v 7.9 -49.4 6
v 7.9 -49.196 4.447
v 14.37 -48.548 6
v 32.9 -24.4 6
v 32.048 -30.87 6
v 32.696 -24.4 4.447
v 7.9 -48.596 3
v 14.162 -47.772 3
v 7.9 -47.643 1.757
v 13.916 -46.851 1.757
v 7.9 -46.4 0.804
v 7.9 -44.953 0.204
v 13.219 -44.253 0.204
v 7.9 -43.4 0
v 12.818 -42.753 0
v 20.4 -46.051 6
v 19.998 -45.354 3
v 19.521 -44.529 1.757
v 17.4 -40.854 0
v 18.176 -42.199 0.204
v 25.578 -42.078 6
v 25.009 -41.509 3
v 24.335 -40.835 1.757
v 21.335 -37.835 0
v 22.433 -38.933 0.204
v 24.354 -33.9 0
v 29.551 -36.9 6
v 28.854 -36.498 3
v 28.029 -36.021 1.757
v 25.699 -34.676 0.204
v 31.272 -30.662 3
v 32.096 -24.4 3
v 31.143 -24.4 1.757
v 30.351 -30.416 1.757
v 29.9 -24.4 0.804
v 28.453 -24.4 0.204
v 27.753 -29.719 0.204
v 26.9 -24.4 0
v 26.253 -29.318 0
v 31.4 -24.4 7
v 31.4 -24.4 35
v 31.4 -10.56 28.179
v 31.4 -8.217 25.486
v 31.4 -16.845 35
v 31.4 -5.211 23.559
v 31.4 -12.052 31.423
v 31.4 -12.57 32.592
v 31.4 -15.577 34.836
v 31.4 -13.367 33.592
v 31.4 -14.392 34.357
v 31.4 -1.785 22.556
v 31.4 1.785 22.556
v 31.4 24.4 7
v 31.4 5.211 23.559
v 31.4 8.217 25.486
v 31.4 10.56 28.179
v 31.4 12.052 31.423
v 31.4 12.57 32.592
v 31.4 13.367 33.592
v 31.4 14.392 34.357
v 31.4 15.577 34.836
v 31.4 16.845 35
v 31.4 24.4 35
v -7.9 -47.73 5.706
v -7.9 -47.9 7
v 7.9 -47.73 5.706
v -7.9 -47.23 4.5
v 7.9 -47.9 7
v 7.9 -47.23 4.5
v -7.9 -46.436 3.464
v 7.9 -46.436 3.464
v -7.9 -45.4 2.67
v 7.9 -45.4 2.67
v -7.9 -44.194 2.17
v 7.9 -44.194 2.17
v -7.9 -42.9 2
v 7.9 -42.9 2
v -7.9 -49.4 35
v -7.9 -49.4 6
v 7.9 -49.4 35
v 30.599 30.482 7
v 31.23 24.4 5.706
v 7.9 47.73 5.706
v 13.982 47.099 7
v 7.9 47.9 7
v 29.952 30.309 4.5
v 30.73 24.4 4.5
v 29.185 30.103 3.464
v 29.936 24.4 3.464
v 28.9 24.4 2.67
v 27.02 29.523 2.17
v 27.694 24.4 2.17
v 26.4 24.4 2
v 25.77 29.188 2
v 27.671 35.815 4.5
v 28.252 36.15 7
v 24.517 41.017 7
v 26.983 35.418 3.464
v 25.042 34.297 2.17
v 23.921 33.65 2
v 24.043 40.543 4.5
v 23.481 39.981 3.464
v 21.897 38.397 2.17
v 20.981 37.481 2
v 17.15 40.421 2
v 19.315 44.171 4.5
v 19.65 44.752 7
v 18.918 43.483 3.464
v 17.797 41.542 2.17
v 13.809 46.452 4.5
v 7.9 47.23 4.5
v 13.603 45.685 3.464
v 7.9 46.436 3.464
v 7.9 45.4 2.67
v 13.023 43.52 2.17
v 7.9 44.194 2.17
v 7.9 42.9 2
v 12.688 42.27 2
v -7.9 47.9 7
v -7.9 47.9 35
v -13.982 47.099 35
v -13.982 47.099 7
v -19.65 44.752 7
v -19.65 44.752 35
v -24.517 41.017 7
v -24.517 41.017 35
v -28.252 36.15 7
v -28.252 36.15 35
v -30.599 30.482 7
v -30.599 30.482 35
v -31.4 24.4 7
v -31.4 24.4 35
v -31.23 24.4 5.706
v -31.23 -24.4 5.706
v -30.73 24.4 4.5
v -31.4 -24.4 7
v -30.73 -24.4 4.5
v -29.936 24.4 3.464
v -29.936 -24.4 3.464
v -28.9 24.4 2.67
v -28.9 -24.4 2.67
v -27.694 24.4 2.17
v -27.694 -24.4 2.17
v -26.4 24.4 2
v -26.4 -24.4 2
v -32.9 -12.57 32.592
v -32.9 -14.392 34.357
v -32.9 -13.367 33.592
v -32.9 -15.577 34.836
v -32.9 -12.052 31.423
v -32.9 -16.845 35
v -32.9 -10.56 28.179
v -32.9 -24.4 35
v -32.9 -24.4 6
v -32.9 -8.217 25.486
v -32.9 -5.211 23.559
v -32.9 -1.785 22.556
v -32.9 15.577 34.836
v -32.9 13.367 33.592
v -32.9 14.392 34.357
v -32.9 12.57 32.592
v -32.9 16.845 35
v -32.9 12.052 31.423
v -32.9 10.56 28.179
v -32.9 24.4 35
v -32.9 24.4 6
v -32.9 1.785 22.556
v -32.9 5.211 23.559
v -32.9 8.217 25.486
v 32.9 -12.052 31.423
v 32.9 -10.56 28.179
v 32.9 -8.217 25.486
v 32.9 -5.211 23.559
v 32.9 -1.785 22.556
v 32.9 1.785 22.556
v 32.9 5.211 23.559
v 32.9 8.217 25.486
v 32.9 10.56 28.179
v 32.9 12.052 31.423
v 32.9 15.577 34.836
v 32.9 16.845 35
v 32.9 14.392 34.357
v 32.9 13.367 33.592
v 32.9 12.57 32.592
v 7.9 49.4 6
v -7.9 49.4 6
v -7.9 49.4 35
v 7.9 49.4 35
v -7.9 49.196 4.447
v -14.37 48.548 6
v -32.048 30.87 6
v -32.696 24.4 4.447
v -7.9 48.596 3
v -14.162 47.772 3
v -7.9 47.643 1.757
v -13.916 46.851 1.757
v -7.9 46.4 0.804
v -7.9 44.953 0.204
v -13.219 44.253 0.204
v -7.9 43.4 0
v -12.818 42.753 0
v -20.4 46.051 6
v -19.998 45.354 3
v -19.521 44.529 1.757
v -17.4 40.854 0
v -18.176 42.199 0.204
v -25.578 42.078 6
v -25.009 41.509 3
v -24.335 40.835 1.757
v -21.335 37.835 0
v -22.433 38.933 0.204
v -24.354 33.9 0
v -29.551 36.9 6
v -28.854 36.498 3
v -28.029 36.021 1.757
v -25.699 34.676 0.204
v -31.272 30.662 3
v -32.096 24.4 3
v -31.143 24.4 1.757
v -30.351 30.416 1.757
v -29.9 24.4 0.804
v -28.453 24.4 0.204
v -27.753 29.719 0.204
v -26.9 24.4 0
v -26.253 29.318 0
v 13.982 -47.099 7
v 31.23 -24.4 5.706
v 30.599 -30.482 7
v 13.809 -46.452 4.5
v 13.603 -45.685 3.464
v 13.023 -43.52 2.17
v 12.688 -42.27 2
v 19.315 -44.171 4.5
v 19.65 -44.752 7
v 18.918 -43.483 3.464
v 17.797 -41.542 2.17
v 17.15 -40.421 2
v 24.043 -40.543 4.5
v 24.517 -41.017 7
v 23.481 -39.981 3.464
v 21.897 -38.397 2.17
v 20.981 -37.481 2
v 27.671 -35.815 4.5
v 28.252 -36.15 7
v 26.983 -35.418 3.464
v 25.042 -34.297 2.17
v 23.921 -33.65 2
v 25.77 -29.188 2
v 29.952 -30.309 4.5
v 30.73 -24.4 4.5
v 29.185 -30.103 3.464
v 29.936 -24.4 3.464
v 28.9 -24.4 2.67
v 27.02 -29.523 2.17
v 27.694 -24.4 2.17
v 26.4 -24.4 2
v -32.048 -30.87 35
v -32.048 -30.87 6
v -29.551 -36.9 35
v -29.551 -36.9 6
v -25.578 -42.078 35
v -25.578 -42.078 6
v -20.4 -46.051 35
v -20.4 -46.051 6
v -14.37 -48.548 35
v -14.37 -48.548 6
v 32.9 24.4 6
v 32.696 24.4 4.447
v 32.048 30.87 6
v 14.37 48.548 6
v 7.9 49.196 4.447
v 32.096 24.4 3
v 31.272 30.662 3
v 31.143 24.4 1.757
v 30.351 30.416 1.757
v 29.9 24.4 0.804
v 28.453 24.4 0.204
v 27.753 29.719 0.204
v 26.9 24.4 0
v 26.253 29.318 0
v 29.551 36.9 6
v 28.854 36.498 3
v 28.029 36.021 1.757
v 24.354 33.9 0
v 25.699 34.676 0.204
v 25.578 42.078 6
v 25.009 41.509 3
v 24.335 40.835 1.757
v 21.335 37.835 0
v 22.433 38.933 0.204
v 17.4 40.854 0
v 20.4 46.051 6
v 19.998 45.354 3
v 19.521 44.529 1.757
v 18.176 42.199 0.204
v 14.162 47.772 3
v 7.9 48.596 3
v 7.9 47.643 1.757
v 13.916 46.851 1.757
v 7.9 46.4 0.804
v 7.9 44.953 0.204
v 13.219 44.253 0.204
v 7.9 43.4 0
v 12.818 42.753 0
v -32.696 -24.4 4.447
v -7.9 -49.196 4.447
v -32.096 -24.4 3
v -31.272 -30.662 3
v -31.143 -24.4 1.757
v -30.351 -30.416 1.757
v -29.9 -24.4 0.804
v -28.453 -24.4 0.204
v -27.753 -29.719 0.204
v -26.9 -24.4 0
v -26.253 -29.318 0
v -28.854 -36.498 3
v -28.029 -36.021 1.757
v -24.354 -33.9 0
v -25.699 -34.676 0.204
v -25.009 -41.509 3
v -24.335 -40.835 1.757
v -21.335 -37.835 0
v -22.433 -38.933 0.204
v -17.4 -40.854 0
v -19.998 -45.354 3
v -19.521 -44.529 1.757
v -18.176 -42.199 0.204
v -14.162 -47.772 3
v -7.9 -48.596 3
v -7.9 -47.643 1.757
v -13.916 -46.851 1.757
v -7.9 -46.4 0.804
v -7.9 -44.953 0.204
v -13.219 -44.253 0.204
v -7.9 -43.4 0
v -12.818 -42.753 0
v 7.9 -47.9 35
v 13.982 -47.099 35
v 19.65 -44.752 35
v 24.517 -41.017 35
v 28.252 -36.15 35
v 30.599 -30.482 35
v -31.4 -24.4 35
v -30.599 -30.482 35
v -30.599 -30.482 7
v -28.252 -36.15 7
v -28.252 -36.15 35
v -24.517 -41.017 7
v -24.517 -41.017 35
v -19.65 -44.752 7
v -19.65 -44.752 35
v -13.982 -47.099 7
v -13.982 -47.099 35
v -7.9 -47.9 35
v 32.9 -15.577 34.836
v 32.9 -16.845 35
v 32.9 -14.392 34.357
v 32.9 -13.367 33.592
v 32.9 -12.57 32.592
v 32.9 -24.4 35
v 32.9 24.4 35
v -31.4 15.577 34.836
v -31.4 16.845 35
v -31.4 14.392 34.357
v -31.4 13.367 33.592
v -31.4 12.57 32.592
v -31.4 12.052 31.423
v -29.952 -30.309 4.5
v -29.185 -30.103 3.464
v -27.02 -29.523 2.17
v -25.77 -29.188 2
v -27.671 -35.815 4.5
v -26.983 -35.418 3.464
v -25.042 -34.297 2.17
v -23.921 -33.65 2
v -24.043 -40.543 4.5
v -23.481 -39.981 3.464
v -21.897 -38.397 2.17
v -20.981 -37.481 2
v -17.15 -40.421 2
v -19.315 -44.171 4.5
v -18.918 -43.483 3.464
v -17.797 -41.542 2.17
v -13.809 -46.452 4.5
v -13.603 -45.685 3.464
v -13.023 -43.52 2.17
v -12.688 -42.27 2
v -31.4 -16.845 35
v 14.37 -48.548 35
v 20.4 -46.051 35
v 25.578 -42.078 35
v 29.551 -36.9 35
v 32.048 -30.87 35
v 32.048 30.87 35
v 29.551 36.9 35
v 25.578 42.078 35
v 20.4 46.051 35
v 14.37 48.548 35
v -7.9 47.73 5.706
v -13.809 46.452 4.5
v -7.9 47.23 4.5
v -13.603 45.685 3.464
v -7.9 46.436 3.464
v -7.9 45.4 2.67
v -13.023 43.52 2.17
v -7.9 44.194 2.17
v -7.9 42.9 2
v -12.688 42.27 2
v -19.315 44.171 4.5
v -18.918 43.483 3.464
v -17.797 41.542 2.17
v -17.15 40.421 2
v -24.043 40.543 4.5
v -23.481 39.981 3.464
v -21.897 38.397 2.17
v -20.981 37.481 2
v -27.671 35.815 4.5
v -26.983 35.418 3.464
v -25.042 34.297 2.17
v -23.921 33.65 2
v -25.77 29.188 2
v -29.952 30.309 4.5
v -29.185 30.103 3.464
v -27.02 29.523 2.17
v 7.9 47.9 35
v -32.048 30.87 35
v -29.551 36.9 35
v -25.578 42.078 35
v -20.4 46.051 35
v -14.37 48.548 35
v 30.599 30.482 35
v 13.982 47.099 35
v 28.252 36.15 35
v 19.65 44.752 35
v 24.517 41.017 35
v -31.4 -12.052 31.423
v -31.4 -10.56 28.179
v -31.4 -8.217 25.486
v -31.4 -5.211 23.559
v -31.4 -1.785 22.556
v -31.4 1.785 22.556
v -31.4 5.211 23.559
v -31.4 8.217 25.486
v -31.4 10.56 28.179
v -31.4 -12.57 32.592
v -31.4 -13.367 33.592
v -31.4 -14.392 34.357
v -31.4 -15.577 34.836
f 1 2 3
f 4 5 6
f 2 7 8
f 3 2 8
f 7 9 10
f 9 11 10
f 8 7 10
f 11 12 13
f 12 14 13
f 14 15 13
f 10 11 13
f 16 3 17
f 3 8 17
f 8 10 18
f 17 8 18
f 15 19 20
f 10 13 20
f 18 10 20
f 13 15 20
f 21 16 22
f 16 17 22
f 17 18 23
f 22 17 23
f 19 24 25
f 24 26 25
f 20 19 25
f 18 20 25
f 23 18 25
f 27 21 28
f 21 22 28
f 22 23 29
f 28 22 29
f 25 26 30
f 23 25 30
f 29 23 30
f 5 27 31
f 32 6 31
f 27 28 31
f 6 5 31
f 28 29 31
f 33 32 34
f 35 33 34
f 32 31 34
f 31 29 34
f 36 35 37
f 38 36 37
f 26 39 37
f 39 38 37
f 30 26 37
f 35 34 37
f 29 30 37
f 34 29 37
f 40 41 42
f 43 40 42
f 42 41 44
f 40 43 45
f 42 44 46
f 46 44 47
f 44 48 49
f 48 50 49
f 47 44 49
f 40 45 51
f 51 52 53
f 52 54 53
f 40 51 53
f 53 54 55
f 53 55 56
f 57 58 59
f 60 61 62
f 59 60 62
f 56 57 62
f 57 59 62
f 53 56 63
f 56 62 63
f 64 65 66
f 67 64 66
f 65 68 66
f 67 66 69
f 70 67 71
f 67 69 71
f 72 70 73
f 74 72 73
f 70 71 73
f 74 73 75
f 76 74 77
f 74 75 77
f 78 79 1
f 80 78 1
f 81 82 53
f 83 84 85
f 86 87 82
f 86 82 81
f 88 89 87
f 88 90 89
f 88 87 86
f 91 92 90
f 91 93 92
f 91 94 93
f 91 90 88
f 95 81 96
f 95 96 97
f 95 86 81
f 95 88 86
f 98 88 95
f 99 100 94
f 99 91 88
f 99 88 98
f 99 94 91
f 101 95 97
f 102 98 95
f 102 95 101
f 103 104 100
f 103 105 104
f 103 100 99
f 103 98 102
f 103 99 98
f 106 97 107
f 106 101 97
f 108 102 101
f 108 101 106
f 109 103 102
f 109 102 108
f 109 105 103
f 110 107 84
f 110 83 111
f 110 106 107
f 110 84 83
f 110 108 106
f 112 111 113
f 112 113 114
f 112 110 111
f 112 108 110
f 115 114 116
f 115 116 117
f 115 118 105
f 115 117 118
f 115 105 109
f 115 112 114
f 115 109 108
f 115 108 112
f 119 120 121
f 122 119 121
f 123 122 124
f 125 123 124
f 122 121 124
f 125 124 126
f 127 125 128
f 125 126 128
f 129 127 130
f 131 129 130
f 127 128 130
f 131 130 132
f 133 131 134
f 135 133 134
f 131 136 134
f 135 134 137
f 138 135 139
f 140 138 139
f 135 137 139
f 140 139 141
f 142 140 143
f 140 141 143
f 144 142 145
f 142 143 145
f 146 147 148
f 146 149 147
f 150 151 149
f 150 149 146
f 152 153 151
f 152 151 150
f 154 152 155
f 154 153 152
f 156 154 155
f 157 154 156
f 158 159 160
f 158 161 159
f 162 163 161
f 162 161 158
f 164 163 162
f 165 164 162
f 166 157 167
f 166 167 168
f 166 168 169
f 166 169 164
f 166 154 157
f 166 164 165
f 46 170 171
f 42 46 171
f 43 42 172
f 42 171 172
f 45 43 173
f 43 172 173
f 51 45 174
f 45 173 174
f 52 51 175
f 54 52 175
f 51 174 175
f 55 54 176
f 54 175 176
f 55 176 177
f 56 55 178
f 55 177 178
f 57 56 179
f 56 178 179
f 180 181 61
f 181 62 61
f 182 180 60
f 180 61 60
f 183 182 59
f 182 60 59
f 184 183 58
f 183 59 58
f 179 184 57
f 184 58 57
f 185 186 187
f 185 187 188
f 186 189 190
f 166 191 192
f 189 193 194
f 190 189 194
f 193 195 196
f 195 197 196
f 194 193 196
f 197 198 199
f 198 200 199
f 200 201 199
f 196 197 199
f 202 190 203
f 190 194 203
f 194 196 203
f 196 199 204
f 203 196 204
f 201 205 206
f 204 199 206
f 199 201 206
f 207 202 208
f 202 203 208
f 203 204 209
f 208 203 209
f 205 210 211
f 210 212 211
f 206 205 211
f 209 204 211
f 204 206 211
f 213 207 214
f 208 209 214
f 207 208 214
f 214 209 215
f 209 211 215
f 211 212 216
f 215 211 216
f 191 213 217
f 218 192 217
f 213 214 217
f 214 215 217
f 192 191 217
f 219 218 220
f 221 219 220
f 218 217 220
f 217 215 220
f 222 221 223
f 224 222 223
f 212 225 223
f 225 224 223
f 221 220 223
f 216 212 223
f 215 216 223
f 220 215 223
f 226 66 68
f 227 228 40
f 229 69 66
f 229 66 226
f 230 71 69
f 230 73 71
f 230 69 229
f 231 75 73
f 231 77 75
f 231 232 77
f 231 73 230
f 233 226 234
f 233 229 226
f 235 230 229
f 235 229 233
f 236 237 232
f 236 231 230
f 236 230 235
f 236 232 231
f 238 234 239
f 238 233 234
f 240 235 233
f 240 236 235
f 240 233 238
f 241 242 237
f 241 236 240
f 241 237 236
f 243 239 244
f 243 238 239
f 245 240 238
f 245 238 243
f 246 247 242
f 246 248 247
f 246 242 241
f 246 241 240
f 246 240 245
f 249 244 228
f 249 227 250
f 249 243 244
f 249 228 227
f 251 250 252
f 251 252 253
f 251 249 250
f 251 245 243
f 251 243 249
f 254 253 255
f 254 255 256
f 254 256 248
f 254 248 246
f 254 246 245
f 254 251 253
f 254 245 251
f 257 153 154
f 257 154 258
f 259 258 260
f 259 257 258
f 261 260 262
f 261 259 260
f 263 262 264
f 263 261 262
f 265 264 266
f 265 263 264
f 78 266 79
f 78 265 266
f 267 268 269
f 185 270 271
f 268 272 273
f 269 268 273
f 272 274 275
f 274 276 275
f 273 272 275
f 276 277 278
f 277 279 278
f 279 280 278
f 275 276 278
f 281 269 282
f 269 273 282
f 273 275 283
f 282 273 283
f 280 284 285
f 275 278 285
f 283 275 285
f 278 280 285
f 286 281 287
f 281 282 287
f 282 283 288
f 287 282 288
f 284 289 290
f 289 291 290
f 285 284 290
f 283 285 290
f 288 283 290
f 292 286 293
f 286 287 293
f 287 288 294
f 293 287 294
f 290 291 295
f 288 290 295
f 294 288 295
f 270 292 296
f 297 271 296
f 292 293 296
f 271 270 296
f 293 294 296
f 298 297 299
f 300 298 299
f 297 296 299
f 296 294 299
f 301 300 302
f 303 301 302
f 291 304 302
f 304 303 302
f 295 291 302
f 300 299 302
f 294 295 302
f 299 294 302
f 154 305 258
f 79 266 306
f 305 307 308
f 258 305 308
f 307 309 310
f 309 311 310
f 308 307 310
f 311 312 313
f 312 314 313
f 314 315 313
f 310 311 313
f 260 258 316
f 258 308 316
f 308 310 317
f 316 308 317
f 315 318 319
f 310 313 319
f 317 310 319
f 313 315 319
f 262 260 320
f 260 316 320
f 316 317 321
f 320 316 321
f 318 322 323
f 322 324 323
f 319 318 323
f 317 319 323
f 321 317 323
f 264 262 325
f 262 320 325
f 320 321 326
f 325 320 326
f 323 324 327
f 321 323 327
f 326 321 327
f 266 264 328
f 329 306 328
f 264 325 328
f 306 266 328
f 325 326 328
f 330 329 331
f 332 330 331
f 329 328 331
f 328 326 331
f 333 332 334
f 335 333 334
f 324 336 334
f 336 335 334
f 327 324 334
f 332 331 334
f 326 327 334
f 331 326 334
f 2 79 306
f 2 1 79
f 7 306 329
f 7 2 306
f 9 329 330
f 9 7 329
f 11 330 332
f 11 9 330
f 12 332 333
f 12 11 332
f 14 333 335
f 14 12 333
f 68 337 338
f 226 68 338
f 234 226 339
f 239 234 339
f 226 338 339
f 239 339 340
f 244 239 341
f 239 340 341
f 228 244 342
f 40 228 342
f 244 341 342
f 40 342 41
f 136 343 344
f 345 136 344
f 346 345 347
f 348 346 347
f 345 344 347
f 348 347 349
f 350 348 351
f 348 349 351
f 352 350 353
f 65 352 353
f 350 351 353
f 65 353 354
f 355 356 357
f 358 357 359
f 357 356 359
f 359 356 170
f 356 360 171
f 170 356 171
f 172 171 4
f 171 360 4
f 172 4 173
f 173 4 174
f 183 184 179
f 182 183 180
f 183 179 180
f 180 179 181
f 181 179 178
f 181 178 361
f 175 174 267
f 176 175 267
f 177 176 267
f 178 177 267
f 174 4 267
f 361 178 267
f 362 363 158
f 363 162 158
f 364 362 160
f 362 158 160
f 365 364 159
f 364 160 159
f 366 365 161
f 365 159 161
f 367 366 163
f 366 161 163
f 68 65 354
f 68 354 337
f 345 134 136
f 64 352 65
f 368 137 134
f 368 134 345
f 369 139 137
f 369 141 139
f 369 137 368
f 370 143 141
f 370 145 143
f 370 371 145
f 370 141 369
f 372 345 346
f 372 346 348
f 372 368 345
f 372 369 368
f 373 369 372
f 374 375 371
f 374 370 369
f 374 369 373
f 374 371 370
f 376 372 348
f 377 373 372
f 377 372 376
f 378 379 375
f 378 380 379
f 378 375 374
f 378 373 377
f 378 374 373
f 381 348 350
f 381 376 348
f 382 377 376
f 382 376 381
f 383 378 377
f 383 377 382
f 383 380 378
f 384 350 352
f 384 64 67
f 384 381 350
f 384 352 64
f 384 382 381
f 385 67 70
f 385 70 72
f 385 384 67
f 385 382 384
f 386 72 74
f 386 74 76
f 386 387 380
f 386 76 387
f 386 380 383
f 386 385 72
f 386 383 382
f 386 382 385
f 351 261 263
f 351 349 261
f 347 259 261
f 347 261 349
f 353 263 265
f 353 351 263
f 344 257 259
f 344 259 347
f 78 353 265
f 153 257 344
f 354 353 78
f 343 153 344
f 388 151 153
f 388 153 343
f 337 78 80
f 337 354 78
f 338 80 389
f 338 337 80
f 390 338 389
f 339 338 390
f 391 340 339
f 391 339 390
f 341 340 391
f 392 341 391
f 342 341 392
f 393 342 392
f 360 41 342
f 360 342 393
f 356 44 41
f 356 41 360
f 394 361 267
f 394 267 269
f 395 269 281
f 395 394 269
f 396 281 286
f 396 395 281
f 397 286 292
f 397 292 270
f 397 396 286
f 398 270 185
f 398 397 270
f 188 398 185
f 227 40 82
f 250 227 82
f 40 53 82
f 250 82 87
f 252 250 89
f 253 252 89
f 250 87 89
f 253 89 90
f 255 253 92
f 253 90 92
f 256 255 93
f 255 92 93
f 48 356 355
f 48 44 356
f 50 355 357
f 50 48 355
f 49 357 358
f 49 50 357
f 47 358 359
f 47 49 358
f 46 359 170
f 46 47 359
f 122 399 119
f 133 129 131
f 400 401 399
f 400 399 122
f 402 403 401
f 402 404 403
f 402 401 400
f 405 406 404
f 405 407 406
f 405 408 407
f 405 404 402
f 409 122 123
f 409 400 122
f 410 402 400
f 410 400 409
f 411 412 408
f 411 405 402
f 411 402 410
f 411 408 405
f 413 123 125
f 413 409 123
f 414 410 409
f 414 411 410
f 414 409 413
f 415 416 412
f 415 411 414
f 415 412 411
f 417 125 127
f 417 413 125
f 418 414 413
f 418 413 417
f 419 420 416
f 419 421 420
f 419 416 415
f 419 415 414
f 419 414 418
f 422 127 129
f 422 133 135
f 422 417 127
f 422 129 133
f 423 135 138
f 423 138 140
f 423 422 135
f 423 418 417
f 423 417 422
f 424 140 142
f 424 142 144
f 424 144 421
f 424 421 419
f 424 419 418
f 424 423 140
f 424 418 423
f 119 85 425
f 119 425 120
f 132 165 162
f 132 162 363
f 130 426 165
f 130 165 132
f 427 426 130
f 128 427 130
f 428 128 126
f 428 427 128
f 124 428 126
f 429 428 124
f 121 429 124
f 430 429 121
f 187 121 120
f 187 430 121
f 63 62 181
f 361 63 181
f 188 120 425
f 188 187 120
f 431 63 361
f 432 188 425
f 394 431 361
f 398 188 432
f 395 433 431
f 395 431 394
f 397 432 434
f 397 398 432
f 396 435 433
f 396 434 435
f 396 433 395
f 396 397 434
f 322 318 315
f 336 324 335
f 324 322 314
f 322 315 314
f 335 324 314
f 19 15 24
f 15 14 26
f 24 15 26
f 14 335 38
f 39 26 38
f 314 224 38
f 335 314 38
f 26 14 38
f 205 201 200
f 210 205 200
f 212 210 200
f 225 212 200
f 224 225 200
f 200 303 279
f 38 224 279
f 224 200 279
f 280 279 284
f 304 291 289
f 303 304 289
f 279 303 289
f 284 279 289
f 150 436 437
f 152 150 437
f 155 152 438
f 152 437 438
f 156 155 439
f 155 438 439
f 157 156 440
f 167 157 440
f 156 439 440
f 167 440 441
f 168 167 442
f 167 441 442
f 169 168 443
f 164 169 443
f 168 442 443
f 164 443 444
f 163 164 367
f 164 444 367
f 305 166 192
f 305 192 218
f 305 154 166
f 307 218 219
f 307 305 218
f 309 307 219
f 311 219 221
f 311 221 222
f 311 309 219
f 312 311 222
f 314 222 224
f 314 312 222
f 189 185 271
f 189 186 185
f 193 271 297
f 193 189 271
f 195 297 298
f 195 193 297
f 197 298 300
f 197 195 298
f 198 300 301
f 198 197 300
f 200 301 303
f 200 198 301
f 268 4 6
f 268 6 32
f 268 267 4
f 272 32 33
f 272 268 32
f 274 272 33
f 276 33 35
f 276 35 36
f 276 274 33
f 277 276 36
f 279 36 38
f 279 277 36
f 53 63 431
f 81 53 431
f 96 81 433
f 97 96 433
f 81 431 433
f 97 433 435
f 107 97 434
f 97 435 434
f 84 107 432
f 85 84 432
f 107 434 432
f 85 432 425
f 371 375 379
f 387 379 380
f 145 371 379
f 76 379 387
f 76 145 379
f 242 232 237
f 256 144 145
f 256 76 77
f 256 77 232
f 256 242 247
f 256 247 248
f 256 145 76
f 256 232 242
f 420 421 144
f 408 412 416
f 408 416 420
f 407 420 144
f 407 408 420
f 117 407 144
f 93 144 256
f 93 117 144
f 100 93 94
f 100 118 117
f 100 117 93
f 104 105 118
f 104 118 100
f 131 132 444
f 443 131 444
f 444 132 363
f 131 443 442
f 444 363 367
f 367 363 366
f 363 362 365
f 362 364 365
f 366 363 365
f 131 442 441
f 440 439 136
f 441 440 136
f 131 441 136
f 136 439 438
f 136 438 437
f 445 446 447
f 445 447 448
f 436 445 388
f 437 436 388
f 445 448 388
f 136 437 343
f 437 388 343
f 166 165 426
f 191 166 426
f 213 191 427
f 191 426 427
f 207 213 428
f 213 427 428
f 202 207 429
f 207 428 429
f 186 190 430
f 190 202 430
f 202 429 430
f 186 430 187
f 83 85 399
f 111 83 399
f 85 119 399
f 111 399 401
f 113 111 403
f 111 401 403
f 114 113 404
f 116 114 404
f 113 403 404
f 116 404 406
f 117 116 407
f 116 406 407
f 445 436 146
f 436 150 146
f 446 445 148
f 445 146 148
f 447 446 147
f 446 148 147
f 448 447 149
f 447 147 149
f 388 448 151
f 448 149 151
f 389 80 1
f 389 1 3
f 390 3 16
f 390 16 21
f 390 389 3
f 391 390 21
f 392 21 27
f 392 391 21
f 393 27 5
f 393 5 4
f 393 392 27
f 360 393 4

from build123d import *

# Parameters (mm, degrees)
F0_W     = 65.8
F0_H     = 98.8
F1_DEPTH = 35
F2_R     = 25
F4_DEPTH = 33
F6_DEPTH = 65.801
F7_R     = 5
F8_R     = 5
F9_R     = 6


with BuildPart() as f1:
    # F0 (on Top) → F1 (new body)
    with BuildSketch(Plane.XY):
        Rectangle(F0_W, F0_H)
    extrude(amount=F1_DEPTH)

    # F2
    f2_edges = [f1.edges().sort_by_distance(p)[0] for p in [
        (32.9, 49.4, 17.5),
        (-32.9, 49.4, 17.5),
        (32.9, -49.4, 17.5),
        (-32.9, -49.4, 17.5),
    ]]
    fillet(f2_edges, radius=F2_R)

    # F3 (on face) → F4 (cut)
    with BuildSketch(Plane.XY.offset(35)):
        with BuildLine():
            Line((31.4, -24.4), (31.4, 24.4))
            ThreePointArc((31.4, 24.4), (24.5170093579, 41.0170093579), (7.9, 47.9))
            Line((7.9, 47.9), (-7.9, 47.9))
            ThreePointArc((-7.9, 47.9), (-24.5170093579, 41.0170093579), (-31.4, 24.4))
            Line((-31.4, 24.4), (-31.4, -24.4))
            ThreePointArc((-31.4, -24.4), (-24.5170093579, -41.0170093579), (-7.9, -47.9))
            Line((-7.9, -47.9), (7.9, -47.9))
            ThreePointArc((7.9, -47.9), (24.5170093579, -41.0170093579), (31.4, -24.4))
        make_face()
    extrude(amount=-F4_DEPTH, mode=Mode.SUBTRACT)

    # F5 (on face) → F6 (cut, through all)
    with BuildSketch(Plane.YZ.offset(32.9)):
        with BuildLine():
            ThreePointArc((-12.5715859231, 35), (0, 22.4284140769), (12.5715859231, 35))
            Line((12.5715859231, 35), (-12.5715859231, 35))
        make_face()
    extrude(amount=-F6_DEPTH, mode=Mode.SUBTRACT)

    # F7
    f7_edges = [f1.edges().sort_by_distance(p)[0] for p in [
        (32.15, 12.571586, 35),
        (-32.15, 12.571586, 35),
        (32.15, -12.571586, 35),
        (-32.15, -12.571586, 35),
    ]]
    fillet(f7_edges, radius=F7_R)

    # F8
    f8_edges = [f1.edges().sort_by_distance(p)[0] for p in [
        (-24.517009, 41.017009, 2),
    ]]
    fillet(f8_edges, radius=F8_R)

    # F9
    f9_edges = [f1.edges().sort_by_distance(p)[0] for p in [
        (-25.57767, -42.07767, 0),
    ]]
    fillet(f9_edges, radius=F9_R)


solid = f1.part
